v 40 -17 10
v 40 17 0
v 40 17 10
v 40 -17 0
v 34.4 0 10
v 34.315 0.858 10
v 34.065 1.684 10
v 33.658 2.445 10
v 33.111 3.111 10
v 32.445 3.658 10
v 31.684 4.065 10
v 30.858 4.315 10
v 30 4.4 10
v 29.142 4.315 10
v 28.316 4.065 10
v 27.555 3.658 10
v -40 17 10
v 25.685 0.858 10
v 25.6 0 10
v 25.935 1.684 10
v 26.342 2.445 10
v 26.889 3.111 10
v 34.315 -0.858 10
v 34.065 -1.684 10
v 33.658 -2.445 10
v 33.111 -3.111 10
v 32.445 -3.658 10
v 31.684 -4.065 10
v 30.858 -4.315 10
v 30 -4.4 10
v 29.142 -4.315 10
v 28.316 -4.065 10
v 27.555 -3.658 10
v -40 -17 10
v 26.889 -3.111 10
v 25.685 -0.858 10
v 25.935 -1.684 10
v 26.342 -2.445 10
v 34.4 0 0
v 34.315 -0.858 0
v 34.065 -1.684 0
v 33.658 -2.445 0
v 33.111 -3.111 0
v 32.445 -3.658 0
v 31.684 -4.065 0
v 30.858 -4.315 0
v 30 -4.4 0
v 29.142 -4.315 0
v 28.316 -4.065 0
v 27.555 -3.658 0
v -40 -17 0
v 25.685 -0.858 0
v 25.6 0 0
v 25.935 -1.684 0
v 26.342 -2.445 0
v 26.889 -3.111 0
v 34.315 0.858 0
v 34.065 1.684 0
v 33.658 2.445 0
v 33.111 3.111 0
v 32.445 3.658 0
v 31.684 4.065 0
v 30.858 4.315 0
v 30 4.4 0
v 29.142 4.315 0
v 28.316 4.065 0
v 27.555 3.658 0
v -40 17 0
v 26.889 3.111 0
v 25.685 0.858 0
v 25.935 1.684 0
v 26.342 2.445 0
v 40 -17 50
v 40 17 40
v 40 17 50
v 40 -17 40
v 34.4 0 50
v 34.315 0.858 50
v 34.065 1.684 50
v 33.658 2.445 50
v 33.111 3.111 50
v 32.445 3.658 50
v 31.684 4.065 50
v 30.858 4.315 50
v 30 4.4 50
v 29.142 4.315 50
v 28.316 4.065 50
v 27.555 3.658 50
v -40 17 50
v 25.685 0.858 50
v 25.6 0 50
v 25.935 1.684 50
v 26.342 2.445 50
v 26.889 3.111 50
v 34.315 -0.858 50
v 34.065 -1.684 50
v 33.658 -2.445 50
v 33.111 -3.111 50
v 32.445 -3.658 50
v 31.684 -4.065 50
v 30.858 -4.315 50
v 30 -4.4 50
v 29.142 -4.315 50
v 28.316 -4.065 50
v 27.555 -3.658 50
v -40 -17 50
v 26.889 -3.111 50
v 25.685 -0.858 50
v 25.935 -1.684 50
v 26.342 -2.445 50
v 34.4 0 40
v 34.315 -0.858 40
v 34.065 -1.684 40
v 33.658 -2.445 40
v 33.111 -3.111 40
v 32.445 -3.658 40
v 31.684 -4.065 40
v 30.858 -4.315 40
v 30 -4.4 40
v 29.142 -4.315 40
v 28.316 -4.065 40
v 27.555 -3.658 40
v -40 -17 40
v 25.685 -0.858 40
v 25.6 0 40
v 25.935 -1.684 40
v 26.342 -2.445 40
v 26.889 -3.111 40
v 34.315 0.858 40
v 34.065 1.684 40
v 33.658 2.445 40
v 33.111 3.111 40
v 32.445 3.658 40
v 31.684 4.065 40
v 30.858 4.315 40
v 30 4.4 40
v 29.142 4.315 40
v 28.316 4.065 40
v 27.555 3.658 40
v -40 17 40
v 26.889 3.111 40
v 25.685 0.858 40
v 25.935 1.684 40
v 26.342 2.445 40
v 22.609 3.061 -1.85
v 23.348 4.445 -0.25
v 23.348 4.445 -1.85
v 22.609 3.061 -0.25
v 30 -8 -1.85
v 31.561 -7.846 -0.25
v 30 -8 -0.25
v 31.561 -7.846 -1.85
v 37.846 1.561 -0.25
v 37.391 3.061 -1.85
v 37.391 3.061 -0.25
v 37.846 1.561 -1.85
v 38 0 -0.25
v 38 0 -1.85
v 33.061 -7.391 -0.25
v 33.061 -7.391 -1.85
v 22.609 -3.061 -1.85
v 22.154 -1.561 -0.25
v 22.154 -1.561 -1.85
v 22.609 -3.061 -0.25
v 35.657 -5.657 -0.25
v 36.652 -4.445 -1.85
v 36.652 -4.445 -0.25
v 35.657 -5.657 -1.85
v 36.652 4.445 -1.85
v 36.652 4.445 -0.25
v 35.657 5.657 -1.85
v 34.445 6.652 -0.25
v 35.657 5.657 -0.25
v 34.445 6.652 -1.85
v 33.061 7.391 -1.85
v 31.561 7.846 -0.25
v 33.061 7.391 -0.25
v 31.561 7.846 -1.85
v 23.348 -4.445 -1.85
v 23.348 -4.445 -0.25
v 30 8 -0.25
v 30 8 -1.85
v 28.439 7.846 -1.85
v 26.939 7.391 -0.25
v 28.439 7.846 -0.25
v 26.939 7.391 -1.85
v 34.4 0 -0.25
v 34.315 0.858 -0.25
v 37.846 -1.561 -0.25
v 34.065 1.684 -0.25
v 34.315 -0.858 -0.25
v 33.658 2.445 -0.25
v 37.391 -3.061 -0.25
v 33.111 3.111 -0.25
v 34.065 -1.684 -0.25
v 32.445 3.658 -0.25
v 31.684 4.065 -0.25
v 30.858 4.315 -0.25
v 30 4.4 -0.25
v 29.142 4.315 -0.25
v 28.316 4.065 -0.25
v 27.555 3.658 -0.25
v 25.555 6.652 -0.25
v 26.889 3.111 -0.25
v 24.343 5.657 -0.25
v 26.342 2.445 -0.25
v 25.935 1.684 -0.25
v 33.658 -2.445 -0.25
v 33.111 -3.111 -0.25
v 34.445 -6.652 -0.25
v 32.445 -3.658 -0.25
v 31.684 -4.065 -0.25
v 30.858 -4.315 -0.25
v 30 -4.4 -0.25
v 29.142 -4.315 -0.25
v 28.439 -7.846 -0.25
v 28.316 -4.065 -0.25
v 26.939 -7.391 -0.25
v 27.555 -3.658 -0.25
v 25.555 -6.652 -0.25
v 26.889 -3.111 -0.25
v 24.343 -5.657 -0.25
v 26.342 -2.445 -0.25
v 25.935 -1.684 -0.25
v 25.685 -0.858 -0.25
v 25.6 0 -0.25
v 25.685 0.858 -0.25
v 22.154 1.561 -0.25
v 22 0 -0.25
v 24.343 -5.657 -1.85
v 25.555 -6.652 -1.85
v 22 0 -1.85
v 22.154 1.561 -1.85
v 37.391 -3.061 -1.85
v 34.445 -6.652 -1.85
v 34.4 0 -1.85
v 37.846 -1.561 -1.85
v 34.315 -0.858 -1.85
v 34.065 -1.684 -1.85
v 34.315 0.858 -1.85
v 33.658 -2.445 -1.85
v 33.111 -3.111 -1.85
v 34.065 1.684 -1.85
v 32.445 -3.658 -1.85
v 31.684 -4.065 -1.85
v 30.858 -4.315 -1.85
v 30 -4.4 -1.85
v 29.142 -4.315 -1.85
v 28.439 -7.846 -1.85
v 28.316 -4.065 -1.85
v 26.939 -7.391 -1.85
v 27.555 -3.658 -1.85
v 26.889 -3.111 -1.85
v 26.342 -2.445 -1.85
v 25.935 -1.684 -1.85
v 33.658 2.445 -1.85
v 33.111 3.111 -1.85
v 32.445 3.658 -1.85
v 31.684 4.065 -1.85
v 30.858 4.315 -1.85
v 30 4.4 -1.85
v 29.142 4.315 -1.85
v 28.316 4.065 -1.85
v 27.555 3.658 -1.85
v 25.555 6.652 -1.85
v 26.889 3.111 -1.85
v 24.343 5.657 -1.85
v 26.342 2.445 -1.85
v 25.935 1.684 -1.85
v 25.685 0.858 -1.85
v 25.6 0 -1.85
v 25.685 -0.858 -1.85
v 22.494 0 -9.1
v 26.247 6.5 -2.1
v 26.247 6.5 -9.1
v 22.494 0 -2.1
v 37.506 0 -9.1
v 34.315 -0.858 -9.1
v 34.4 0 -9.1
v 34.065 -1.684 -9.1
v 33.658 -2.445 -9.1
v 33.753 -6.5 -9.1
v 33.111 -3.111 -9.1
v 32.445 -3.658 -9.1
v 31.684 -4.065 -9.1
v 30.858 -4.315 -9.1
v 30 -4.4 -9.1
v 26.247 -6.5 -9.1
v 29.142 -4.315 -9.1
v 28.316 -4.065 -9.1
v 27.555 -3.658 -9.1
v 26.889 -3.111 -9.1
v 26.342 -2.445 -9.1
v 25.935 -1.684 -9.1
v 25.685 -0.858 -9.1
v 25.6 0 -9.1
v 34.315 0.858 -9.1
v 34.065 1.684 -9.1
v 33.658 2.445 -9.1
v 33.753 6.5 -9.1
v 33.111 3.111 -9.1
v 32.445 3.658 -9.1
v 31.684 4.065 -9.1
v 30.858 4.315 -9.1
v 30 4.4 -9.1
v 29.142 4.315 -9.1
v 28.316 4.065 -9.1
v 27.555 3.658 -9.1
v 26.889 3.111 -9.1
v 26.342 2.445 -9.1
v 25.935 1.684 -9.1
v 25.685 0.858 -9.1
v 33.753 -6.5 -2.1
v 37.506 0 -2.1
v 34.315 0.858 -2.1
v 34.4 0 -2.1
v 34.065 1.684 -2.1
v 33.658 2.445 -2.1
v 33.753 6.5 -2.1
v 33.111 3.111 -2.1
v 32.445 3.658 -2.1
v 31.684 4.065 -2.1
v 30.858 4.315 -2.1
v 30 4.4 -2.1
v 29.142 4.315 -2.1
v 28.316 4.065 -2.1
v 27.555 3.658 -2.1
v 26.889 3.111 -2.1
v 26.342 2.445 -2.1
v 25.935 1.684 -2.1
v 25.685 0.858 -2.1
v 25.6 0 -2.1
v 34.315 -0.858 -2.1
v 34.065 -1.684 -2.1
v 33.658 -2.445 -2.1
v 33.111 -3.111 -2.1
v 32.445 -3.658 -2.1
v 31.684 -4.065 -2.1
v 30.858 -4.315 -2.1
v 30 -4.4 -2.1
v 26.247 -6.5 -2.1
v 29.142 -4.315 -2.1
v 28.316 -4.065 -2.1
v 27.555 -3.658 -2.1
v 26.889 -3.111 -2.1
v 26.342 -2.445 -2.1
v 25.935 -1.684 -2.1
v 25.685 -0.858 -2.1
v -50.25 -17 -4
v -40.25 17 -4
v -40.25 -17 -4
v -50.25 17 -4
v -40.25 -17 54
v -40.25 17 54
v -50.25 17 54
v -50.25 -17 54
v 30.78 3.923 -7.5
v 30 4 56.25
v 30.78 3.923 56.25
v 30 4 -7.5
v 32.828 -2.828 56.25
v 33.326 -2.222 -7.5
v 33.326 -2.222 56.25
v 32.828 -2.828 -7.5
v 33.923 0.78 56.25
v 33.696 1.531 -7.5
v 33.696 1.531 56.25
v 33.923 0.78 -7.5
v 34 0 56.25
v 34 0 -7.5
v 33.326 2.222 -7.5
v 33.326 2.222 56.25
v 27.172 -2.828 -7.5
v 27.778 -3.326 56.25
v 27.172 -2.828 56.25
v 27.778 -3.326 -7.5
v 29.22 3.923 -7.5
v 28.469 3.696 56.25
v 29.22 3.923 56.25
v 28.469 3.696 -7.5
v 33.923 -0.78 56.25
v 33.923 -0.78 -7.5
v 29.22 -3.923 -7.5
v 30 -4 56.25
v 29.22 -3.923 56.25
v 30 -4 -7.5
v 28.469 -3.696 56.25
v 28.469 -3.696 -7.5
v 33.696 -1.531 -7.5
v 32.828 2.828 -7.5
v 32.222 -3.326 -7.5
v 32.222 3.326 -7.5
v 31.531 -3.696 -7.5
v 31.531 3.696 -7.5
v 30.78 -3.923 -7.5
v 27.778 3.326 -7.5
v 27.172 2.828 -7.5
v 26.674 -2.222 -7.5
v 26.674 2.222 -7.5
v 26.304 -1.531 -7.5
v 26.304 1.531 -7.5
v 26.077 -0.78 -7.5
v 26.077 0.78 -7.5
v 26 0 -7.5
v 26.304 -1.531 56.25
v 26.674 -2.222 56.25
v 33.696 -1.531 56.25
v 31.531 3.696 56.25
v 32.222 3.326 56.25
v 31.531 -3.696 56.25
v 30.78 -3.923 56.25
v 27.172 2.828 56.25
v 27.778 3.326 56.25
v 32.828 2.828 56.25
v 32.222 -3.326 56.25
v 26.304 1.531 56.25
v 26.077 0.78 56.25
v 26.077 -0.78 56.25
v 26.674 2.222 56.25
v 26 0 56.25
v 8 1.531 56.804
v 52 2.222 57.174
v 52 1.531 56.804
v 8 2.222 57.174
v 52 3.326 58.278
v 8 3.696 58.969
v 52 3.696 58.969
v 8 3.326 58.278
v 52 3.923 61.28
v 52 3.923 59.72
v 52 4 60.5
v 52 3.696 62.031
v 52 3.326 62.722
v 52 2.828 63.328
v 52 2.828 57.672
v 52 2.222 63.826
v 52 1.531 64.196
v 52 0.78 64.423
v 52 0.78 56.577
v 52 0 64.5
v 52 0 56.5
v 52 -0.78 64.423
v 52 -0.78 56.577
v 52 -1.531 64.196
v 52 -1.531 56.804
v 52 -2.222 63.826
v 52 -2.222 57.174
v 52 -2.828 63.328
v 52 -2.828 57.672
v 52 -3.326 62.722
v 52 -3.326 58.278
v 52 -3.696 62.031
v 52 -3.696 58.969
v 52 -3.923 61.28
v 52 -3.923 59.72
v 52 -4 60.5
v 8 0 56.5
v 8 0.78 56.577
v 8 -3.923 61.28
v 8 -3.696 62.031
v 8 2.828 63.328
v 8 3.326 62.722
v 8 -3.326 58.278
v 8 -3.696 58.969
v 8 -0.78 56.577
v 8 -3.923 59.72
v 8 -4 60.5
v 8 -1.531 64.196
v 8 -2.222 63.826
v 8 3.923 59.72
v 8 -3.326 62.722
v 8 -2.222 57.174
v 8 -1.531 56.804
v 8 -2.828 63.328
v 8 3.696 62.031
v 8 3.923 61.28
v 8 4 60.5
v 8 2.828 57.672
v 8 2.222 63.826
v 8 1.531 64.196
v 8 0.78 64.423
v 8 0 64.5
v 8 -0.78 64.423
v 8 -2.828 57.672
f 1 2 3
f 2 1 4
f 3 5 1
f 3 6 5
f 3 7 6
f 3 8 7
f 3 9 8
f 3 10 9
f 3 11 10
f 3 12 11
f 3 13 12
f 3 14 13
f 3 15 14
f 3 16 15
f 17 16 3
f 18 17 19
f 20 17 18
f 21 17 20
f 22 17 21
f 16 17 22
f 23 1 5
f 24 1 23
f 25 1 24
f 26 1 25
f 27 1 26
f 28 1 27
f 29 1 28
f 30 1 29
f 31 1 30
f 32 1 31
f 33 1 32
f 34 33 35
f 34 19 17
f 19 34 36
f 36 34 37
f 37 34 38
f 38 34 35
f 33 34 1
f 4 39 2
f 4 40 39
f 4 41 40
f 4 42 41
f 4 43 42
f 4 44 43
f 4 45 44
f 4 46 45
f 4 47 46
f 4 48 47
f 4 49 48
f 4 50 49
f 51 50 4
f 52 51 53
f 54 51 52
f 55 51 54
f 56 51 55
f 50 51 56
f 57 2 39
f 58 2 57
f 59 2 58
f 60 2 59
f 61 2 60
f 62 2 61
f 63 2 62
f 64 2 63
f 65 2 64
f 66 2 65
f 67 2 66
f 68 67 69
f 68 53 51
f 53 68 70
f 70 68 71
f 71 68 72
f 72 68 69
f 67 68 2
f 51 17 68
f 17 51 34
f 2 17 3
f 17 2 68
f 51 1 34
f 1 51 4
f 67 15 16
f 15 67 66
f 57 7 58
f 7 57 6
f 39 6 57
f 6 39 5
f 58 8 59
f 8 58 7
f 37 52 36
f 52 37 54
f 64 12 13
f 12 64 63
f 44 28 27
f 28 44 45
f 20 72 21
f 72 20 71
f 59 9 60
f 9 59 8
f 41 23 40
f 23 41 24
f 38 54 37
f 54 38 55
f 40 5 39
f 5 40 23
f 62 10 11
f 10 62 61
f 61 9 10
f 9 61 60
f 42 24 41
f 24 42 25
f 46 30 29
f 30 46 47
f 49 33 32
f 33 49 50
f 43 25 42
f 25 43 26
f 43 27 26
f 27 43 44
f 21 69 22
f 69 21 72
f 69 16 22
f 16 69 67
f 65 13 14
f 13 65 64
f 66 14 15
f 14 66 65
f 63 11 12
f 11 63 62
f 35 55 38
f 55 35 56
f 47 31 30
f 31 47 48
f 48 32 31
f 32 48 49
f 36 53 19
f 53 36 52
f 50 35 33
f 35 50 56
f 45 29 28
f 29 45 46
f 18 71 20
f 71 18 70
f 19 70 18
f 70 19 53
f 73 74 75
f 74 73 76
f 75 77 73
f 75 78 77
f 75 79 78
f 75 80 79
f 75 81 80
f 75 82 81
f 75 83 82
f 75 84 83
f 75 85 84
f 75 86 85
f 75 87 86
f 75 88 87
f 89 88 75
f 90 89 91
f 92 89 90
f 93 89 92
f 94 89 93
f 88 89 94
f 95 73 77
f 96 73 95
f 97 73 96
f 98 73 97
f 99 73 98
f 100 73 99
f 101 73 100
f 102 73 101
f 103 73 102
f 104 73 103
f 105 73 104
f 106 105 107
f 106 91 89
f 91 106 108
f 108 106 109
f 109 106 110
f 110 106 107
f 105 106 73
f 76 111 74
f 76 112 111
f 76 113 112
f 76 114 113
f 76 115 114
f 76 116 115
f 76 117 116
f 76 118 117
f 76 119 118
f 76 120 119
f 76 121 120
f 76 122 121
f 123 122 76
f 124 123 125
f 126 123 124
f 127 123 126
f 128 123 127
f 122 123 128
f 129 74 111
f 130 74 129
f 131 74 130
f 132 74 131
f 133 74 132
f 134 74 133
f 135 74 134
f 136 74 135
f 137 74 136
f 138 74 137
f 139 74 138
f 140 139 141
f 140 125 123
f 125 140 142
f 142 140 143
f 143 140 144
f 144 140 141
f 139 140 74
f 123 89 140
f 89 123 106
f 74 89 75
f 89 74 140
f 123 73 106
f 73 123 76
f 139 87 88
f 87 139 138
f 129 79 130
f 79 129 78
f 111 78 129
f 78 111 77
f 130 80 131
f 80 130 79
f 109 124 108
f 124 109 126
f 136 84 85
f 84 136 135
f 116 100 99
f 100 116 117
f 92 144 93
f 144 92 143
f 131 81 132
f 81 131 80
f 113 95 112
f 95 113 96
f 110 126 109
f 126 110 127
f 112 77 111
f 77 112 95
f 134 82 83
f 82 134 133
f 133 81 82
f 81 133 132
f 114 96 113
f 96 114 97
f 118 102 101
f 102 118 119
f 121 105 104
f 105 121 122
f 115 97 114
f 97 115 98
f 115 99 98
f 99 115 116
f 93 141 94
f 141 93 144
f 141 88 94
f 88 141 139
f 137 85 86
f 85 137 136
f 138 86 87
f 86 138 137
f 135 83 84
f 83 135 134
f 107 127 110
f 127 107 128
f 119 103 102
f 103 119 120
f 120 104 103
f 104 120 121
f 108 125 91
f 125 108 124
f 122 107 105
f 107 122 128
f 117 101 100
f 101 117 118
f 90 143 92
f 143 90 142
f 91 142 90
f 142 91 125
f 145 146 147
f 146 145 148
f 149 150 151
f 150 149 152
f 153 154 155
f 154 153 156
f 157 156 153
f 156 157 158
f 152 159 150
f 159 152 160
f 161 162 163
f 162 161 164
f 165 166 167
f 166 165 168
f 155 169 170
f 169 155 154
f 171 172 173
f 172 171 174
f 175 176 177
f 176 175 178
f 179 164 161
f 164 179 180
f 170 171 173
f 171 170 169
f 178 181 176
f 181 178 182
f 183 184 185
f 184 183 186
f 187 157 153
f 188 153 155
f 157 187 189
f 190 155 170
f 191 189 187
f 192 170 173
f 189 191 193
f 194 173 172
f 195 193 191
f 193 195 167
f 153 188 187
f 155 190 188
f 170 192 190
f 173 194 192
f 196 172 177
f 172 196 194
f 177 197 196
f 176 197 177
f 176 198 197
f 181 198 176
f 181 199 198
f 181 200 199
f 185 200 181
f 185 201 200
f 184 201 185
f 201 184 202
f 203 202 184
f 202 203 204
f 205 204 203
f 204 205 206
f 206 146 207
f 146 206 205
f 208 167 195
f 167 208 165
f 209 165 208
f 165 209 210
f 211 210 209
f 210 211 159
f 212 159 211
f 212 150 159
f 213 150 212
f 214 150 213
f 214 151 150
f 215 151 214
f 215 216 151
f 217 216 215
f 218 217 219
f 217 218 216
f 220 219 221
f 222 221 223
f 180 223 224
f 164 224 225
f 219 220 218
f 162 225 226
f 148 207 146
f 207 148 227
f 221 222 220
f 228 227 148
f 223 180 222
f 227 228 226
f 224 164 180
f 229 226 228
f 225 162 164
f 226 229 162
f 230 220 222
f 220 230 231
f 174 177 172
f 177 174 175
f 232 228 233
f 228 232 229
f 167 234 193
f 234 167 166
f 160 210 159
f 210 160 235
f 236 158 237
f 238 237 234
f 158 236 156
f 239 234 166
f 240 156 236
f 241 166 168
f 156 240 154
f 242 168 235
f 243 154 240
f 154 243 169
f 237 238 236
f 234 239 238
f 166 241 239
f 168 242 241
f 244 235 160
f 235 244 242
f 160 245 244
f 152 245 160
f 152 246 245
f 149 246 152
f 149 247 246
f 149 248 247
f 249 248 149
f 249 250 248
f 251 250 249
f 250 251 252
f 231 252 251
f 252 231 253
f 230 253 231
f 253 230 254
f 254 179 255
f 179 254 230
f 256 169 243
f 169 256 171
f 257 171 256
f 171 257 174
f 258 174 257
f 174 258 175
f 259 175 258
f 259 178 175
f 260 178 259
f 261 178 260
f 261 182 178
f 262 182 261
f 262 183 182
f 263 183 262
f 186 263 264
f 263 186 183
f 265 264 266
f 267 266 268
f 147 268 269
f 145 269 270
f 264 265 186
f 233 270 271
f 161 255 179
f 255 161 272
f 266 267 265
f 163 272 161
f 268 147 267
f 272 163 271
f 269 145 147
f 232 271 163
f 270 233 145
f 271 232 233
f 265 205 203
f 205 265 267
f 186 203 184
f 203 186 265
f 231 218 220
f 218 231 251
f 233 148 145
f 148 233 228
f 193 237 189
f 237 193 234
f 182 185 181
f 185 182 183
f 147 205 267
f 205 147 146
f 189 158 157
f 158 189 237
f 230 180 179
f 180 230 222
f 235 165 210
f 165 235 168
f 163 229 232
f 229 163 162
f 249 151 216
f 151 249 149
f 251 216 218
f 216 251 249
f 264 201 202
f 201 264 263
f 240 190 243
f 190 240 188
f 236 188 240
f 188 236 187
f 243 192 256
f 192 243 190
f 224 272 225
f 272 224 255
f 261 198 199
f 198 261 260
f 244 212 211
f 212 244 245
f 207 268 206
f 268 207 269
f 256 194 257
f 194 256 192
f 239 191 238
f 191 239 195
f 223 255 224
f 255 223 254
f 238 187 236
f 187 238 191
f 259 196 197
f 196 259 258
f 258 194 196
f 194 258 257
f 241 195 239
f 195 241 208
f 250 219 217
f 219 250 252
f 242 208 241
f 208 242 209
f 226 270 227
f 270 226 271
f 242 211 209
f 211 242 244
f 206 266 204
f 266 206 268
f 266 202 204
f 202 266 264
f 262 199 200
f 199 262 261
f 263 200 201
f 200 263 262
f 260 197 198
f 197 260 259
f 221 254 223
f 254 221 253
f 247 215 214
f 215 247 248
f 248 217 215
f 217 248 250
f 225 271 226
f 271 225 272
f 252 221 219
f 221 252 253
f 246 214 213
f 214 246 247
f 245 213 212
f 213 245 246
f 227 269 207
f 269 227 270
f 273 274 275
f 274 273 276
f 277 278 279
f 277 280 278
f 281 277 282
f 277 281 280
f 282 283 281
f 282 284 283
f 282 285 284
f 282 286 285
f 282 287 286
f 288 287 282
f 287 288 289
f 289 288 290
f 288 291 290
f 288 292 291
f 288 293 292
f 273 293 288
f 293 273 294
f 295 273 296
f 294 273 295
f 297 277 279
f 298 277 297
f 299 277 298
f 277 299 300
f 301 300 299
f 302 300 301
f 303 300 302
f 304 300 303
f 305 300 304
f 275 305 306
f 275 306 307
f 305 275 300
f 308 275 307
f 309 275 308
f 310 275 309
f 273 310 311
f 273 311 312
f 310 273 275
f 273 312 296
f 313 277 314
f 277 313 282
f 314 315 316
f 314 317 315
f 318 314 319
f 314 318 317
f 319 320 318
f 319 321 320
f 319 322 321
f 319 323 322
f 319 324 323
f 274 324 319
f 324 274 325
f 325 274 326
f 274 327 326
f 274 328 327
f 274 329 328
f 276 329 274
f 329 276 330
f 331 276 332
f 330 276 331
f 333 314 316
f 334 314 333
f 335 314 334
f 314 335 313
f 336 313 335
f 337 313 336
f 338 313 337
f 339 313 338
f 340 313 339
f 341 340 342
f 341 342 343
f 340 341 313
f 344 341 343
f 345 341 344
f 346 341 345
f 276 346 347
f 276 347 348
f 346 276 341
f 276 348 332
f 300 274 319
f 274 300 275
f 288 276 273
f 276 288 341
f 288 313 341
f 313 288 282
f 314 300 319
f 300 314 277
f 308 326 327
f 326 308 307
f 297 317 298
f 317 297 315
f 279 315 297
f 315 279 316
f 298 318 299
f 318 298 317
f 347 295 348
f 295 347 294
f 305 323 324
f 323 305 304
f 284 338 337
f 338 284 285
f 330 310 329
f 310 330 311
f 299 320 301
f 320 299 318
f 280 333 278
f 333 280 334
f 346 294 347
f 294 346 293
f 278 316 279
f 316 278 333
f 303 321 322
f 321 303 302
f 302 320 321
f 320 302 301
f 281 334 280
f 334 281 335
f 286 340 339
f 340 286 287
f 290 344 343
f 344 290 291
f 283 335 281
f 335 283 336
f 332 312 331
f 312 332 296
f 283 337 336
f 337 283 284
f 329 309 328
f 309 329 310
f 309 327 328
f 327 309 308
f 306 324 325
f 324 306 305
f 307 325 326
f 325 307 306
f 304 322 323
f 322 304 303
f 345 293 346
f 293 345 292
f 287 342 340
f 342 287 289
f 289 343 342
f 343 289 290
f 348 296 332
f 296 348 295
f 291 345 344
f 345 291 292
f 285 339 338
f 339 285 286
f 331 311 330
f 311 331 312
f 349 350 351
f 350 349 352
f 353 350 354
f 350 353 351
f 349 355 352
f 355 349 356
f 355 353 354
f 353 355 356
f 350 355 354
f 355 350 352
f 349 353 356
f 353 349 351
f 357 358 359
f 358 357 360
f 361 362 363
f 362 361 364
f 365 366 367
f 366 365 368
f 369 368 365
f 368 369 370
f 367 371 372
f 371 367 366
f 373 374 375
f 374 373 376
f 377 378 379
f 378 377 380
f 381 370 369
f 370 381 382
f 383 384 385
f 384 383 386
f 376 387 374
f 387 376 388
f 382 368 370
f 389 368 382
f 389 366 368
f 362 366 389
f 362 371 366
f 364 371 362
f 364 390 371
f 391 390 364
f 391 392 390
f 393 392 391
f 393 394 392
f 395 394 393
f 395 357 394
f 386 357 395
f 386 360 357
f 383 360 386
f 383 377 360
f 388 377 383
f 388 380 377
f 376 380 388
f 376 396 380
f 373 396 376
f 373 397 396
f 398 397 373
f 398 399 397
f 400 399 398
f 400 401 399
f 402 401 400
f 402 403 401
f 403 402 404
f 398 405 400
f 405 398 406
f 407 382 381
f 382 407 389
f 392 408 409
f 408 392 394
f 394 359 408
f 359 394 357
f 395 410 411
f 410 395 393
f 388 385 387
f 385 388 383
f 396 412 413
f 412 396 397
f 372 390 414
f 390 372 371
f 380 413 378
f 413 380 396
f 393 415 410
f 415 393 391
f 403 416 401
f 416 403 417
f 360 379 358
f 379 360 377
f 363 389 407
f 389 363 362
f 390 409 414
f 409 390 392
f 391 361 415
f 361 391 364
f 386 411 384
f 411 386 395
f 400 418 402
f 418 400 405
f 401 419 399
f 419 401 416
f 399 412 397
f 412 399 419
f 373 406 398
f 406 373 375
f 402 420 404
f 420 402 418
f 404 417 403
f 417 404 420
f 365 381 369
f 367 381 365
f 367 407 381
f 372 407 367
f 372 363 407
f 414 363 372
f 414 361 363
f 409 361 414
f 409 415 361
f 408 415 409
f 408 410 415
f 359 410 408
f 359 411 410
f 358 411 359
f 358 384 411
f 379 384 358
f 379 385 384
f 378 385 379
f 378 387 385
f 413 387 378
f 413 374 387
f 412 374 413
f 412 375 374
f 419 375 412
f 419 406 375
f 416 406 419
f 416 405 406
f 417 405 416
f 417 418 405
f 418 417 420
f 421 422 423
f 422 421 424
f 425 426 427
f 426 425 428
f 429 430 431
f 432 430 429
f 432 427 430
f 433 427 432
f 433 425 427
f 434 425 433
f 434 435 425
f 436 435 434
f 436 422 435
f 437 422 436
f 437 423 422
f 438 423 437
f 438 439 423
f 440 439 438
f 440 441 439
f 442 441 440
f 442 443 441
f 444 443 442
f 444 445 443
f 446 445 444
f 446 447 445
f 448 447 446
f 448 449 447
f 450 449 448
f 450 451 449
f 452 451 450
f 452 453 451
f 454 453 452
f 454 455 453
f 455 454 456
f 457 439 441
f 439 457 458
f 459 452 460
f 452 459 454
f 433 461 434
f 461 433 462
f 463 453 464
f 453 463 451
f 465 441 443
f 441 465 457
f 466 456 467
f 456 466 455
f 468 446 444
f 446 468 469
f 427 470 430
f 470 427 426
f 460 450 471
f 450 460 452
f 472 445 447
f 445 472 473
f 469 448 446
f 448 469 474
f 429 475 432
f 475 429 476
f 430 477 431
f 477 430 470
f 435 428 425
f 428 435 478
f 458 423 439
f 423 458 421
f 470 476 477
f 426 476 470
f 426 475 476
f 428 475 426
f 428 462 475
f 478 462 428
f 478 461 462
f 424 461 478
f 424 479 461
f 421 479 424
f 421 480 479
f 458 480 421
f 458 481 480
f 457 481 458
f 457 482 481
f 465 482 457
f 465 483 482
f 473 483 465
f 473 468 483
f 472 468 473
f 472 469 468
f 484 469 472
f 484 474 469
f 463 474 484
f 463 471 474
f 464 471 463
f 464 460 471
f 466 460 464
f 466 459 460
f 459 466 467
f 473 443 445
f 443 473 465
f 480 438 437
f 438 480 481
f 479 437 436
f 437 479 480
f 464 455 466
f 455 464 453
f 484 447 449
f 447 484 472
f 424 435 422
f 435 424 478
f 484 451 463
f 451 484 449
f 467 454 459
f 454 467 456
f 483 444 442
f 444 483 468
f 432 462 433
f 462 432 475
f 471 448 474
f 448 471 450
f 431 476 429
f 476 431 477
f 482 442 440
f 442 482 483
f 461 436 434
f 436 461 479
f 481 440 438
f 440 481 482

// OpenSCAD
$fn = 32;

// ------------------------------------------------------------------------
// C clamp: throat 40 mm, screw d8
// Every part is its own module, assembly() places every instance.
// ------------------------------------------------------------------------

// --- part 1 ---
module clamp_arm() {
  difference() {
    translate([-40, -17, 0]) cube([80, 34, 10]);
    translate([30, 0, -1]) cylinder(h = 12, d = 8.8);
  }
}

// --- part 2 ---
module clamp_spine() {
  difference() {
    translate([-29, -17, 0]) cube([58, 34, 10]);
  }
}

// --- part 3 ---
module clamp_screw() {
  translate([0, 0, -31.875]) cylinder(h = 63.75, d = 8);
}

// --- part 4 ---
module clamp_washer() {
  difference() {
      translate([0, 0, 0]) cylinder(h = 1.6, d = 16);
      translate([0, 0, -1]) cylinder(h = 3.6, d = 8.8);
    }
}

// --- part 5 ---
module clamp_nut() {
  difference() {
    linear_extrude(height = 7) polygon(points = [[7.506, 0], [3.753, 6.5], [-3.753, 6.5], [-7.506, 0], [-3.753, -6.5], [3.753, -6.5]]);
    translate([0, 0, -1]) cylinder(h = 9, d = 8.8);
  }
}

// --- part 6 ---
module tommy_bar() {
  translate([0, 0, -22]) cylinder(h = 44, d = 8);
}

// --- assembly ---
module assembly() {
  color([0.80, 0.24, 0.20]) translate([0, 0, 0]) rotate([0, 0, 0]) clamp_arm();
  color([0.20, 0.45, 0.75]) translate([0, 0, 40]) rotate([0, 0, 0]) clamp_arm();
  color([0.25, 0.62, 0.32]) translate([-50.25, 0, 25]) rotate([0, 90, 0]) clamp_spine();
  color([0.92, 0.70, 0.18]) translate([30, 0, 24.375]) rotate([0, 0, 0]) clamp_screw();
  color([0.58, 0.35, 0.70]) translate([30, 0, -1.85]) rotate([0, 0, 0]) clamp_washer();
  color([0.16, 0.66, 0.66]) translate([30, 0, -9.1]) rotate([0, 0, 0]) clamp_nut();
  color([0.85, 0.48, 0.18]) translate([30, 0, 60.5]) rotate([0, 90, 0]) tommy_bar();
}

assembly();
